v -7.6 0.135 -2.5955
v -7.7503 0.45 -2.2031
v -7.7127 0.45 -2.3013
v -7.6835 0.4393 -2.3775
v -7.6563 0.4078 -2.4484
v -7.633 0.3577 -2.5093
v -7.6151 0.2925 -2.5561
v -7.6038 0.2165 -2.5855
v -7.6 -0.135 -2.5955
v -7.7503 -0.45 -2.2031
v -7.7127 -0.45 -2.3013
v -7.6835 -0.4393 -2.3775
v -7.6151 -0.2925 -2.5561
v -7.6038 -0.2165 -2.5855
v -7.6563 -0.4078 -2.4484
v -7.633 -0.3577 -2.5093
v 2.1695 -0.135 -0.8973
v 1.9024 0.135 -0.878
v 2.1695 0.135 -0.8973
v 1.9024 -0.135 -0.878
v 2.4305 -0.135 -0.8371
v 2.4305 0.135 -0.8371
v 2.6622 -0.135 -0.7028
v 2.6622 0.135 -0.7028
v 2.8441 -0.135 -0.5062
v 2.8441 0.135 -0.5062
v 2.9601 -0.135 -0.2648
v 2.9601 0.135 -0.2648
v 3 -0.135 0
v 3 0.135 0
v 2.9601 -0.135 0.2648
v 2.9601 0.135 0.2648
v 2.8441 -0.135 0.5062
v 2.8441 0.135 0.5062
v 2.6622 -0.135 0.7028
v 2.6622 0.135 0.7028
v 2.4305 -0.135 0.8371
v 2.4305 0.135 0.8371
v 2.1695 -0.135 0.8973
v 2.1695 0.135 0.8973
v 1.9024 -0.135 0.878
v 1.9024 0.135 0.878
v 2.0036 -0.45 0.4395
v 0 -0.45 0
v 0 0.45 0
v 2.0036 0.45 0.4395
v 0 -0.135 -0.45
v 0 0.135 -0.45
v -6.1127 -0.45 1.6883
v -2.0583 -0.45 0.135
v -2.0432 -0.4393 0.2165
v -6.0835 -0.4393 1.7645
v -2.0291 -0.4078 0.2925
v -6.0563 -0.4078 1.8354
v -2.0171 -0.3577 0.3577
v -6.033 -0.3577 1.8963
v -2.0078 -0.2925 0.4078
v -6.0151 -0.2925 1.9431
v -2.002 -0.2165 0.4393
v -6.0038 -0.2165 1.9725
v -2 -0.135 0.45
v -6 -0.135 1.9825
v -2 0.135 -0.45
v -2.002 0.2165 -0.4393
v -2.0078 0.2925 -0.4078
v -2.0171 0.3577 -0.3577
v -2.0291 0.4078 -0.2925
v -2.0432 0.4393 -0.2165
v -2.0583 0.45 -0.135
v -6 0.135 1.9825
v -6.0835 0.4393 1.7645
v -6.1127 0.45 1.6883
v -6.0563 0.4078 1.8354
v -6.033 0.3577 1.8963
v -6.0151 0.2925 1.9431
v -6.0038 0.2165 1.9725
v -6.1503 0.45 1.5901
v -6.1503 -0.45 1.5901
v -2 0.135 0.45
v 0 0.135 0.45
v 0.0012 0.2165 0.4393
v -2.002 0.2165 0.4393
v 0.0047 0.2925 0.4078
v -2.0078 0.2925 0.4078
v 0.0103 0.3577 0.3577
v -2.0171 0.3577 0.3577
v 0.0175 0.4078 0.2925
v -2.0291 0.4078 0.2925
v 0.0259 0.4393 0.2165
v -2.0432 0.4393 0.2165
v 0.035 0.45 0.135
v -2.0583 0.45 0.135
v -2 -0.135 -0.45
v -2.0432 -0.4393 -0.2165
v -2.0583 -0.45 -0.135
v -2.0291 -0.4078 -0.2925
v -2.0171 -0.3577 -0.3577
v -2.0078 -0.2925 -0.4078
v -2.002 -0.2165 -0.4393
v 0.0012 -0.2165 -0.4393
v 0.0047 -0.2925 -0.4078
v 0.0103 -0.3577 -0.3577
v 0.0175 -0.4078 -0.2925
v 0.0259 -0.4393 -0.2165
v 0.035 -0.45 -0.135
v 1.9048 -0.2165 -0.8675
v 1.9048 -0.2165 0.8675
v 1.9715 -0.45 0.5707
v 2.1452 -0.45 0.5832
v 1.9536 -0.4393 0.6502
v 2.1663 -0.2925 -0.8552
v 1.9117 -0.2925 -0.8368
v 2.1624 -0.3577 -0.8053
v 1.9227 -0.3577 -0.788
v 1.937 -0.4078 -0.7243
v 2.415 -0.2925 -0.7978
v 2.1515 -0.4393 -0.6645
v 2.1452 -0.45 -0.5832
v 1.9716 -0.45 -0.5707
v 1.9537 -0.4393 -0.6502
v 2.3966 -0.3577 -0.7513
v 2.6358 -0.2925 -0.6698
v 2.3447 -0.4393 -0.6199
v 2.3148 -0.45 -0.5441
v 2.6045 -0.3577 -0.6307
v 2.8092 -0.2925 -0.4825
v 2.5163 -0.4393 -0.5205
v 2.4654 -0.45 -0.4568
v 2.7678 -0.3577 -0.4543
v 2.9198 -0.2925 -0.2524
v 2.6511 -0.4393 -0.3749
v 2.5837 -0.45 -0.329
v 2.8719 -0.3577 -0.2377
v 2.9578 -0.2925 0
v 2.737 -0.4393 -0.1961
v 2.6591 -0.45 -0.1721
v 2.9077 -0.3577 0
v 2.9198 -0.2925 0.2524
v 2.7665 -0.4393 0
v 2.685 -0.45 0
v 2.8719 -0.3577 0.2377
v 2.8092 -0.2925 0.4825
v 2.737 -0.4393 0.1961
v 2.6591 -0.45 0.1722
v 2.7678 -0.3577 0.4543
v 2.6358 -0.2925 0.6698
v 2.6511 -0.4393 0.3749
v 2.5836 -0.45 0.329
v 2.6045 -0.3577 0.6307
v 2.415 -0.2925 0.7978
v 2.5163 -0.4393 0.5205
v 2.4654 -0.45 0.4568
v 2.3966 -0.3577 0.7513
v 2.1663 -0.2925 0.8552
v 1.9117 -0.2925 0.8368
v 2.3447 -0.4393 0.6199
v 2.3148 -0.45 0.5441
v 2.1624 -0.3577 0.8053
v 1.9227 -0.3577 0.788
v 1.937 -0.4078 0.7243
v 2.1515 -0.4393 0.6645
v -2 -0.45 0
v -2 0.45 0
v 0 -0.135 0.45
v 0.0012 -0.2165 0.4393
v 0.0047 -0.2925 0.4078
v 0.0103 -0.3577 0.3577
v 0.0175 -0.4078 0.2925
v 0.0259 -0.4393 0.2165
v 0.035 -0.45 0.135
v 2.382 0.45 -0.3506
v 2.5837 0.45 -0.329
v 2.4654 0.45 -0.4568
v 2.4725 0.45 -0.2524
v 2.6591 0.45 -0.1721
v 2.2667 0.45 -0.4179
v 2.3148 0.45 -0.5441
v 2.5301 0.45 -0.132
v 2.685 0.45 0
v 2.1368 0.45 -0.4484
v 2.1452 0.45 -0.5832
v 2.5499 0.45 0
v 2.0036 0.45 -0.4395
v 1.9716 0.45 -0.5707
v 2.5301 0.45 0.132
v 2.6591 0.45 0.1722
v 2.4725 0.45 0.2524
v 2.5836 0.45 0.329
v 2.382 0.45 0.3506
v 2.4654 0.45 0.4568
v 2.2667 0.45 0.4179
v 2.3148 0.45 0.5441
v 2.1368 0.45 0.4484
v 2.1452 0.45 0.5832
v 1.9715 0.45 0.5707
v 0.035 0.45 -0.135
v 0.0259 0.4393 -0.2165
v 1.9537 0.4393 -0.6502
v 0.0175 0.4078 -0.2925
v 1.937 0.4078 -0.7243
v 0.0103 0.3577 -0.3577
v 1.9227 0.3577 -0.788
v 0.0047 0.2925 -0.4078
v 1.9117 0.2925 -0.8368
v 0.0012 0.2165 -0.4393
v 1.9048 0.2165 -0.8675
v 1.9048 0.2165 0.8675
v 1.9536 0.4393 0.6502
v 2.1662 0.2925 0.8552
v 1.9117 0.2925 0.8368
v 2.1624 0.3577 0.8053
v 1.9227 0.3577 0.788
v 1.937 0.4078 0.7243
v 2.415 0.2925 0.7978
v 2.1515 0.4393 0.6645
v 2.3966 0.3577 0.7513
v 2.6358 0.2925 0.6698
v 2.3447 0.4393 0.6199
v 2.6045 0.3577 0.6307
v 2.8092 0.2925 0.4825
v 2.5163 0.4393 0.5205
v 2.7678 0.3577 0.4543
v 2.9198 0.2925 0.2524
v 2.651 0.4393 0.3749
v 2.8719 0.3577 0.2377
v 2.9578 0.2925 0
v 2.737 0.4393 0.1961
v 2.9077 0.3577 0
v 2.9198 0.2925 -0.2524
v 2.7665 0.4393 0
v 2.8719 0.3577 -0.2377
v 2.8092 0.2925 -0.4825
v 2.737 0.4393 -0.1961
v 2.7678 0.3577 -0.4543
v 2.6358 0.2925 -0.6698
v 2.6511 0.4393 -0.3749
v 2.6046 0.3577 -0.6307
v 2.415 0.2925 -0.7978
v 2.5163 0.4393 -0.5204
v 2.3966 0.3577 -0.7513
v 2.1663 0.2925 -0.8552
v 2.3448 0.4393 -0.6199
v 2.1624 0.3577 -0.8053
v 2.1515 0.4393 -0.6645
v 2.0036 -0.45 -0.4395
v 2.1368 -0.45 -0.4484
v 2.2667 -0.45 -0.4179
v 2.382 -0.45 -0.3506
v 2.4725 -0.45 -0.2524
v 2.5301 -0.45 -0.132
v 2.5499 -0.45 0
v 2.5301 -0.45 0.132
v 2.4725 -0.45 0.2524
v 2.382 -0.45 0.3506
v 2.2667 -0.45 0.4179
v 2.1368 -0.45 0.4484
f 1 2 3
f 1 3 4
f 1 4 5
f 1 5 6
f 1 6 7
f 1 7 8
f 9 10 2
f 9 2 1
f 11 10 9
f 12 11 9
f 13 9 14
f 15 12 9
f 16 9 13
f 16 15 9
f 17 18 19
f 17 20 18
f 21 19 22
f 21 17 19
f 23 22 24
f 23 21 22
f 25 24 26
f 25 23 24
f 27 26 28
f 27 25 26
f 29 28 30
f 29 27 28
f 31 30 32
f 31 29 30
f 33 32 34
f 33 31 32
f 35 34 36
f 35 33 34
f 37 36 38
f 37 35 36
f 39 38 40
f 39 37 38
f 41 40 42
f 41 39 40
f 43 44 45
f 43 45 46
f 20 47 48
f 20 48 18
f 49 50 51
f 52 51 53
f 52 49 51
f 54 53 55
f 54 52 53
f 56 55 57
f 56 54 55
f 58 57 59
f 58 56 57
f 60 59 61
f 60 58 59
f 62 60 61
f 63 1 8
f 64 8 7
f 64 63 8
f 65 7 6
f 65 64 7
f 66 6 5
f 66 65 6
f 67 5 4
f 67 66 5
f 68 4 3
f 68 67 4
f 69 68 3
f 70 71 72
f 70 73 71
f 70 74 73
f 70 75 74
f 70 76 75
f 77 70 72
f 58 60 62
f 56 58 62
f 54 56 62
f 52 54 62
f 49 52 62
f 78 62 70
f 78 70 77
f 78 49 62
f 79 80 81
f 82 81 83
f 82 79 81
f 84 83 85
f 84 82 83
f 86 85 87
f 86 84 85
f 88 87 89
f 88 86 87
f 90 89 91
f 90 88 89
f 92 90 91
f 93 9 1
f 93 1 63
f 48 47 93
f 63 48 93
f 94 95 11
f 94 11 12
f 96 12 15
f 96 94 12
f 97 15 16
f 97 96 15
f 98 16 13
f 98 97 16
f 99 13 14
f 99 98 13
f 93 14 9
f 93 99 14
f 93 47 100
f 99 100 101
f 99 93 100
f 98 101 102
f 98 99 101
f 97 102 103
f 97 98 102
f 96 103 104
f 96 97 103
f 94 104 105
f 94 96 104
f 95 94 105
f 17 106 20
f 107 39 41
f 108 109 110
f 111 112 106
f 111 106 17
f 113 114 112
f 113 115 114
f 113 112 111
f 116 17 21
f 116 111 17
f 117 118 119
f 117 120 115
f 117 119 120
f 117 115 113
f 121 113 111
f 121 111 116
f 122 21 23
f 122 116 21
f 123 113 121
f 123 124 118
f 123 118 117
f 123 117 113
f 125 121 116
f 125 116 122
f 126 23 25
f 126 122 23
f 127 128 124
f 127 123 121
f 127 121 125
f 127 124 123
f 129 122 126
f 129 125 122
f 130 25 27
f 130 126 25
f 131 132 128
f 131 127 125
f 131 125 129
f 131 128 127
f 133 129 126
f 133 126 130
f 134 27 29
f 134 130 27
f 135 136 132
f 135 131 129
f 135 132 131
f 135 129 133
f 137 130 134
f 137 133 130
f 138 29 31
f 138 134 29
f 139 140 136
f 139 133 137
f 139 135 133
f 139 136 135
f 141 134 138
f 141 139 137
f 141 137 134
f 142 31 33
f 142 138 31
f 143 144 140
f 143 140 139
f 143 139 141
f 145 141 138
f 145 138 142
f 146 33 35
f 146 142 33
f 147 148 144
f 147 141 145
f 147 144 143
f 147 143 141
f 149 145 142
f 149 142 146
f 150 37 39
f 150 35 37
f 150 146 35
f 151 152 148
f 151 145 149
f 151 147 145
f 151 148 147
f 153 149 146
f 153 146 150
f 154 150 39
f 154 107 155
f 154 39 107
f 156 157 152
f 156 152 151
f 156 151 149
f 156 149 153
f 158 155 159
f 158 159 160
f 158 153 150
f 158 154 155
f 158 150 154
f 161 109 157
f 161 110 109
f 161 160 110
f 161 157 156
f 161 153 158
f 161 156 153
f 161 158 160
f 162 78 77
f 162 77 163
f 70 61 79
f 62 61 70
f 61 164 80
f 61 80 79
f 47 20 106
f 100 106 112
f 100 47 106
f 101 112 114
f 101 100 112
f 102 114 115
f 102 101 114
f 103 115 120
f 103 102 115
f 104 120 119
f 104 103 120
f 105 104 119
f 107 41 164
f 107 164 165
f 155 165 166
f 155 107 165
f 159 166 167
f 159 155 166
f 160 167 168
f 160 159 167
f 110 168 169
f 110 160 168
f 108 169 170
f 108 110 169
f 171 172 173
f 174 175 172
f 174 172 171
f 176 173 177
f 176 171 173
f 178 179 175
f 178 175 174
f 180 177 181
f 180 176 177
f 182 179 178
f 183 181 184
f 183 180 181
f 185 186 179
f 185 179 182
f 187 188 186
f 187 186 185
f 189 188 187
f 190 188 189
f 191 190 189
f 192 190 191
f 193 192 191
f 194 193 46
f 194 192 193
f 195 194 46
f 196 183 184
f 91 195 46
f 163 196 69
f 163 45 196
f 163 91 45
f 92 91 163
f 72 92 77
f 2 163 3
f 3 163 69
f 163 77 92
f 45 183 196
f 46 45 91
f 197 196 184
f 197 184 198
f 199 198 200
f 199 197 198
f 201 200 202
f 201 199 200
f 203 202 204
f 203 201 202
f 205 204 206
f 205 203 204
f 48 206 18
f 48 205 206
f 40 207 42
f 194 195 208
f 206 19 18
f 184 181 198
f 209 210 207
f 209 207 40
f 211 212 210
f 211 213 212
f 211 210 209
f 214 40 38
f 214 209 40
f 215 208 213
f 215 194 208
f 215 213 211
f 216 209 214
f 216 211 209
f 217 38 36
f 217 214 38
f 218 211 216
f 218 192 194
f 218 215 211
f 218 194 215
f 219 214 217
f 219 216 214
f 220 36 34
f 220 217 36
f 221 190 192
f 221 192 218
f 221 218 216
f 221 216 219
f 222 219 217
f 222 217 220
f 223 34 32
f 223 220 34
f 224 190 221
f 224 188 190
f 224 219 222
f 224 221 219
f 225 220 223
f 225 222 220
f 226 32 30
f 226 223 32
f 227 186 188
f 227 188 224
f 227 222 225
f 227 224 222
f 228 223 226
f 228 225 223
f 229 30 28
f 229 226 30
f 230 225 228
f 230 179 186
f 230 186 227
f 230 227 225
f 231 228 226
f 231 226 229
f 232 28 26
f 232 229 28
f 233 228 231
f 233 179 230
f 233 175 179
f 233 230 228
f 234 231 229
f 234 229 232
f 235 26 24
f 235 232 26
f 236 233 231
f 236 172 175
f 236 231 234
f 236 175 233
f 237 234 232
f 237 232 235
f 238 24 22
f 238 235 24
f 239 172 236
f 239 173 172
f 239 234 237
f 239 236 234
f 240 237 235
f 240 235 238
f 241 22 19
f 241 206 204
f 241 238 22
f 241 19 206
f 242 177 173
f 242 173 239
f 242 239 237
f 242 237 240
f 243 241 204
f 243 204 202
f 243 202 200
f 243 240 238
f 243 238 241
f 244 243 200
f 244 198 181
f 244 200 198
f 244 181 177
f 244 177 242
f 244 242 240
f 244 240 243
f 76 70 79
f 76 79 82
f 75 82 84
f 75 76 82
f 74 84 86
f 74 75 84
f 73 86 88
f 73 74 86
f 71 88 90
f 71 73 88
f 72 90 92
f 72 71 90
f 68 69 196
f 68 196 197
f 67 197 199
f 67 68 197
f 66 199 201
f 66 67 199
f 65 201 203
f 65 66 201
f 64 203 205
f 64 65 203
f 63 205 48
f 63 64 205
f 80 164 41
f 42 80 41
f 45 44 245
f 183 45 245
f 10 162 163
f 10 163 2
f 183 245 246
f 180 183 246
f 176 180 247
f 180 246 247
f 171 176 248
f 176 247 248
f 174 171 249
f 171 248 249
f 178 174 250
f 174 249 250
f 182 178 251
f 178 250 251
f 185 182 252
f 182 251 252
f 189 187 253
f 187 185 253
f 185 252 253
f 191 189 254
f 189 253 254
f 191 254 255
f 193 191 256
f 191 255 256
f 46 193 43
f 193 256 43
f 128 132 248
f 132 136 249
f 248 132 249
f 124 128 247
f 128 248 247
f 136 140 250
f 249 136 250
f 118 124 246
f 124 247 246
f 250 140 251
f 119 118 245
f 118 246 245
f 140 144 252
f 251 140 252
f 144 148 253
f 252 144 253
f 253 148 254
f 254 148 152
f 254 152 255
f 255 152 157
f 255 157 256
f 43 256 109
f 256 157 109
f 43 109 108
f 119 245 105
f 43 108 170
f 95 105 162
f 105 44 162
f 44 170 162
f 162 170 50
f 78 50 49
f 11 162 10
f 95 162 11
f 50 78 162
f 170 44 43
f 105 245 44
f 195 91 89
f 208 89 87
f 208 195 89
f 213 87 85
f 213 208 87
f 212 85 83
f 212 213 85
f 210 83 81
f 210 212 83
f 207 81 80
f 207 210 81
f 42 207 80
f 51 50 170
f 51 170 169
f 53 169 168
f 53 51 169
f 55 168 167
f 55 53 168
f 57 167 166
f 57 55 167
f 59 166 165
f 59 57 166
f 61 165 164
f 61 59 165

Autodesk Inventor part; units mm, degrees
ref_plane "YZ Plane" through (0, 0, 0) normal (1, 0, 0) x (0, 1, 0)
sketch "Skizze1" plane through (0, 0, 0) normal (0, 1, 0) x (-1, 0, 0)
  arc A0 (-1.9024, 0.878) -> (-1.9024, -0.878) centre (-2.1, 0) ccw
  arc A1 (-2.0036, 0.4395) -> (-2.0036, -0.4395) centre (-2.1, 0) ccw
  line L0 (0, 0.45) -> (2, 0.45)
  line L1 (0, -0.45) -> (2, -0.45)
  line L2 (2, 0.45) -> (6, 1.9825)
  line L3 (6, 1.9825) -> (6.1503, 1.5901)
  line L4 (6.1503, 1.5901) -> (2, 0)
  line L5 (2, 0) -> (7.7503, -2.2031)
  line L6 (7.7503, -2.2031) -> (7.6, -2.5955)
  line L7 (7.6, -2.5955) -> (2, -0.45)
  line L8 (0, 0) -> (-2.0036, -0.4395)
  line L9 (0, 0) -> (-2.0036, 0.4395)
  line L10 (0, 0.45) -> (0, -0.45) construction
  line L11 (0, 0.45) -> (-1.9024, 0.878)
  line L12 (0, -0.45) -> (-1.9024, -0.878)
  line L13 (-3, 0) -> (2, 0) construction
  line L14 (2, 0.45) -> (2, -0.45) construction
  dimension "d0" = 2
  dimension "d1" = 6
  dimension "d2" = 159.037
  dimension "d3" = 159.037
  dimension "d4" = 1.6
  dimension "d5" = 0.45
  dimension "d6" = 0.9
  dimension "d7" = 0.45
  dimension "d8" = 0.45
  dimension "d9" = 2.1
extrude "Körper" add sketch "Skizze1" along normal mid plane 0.9
fillet "Rundung" radius 0.315 14 edges at (-4, -0.45, 1.2162) (-4, 0.45, 1.2162) (-1, -0.45, 0.45) (-1, 0.45, 0.45) (3, -0.45, 0) (0.9512, -0.45, -0.664) (0.9512, -0.45, 0.664) (3, 0.45, 0) (0.9512, 0.45, 0.664) (0.9512, 0.45, -0.664) (-1, -0.45, -0.45) (-4.8, -0.45, -1.5227) (-1, 0.45, -0.45) (-4.8, 0.45, -1.5227)
ref_plane "Work Plane1" through (0, -10, 0) normal (0, 0, -1) x (0, 1, 0)
ref_plane "Work Plane3" through (0, 0, 0.45) normal (-1, 0, 0) x (0, 1, 0)
equation "\"d0\" = MSIAB"
equation "\"d1\" = SNLG"
equation "\"d4\" = LGDIF"
equation "\"d5\" = -0.5 * SNND1 + 0.5 * KBR"
equation "\"d6\" = 0.5 * KBR"
equation "\"d7\" = 0.5 * SNND1"
equation "\"d8\" = 0.5 * SNND1"
equation "\"d9\" = KOL - 0.5 * KBR"
equation "\"d10\" = SNND1"
equation "\"d12\" = 0.35 * SNND1"
equation "\"SNND\" = 1"
equation "\"SNLG\" = 6"
equation "\"SNND1\" = 0.9"
equation "\"KBR\" = 1.8"
equation "\"KOL\" = 3"
equation "\"LGDIF\" = 1.6"
equation "\"MSIAB\" = 2"
equation "\"BDMI\" = 3"
equation "\"NNDMIN\" = 3.5"
equation "\"SPBOR\" = SNND"
equation "\"DSH\" = 2.2"
equation "\"NNDMAX\" = 4.5"
equation "\"PNDST\" = 4"
equation "\"BDMA\" = 4"
properties part number "DIN 94 - 1 x 6" material "Stahl, weich"
